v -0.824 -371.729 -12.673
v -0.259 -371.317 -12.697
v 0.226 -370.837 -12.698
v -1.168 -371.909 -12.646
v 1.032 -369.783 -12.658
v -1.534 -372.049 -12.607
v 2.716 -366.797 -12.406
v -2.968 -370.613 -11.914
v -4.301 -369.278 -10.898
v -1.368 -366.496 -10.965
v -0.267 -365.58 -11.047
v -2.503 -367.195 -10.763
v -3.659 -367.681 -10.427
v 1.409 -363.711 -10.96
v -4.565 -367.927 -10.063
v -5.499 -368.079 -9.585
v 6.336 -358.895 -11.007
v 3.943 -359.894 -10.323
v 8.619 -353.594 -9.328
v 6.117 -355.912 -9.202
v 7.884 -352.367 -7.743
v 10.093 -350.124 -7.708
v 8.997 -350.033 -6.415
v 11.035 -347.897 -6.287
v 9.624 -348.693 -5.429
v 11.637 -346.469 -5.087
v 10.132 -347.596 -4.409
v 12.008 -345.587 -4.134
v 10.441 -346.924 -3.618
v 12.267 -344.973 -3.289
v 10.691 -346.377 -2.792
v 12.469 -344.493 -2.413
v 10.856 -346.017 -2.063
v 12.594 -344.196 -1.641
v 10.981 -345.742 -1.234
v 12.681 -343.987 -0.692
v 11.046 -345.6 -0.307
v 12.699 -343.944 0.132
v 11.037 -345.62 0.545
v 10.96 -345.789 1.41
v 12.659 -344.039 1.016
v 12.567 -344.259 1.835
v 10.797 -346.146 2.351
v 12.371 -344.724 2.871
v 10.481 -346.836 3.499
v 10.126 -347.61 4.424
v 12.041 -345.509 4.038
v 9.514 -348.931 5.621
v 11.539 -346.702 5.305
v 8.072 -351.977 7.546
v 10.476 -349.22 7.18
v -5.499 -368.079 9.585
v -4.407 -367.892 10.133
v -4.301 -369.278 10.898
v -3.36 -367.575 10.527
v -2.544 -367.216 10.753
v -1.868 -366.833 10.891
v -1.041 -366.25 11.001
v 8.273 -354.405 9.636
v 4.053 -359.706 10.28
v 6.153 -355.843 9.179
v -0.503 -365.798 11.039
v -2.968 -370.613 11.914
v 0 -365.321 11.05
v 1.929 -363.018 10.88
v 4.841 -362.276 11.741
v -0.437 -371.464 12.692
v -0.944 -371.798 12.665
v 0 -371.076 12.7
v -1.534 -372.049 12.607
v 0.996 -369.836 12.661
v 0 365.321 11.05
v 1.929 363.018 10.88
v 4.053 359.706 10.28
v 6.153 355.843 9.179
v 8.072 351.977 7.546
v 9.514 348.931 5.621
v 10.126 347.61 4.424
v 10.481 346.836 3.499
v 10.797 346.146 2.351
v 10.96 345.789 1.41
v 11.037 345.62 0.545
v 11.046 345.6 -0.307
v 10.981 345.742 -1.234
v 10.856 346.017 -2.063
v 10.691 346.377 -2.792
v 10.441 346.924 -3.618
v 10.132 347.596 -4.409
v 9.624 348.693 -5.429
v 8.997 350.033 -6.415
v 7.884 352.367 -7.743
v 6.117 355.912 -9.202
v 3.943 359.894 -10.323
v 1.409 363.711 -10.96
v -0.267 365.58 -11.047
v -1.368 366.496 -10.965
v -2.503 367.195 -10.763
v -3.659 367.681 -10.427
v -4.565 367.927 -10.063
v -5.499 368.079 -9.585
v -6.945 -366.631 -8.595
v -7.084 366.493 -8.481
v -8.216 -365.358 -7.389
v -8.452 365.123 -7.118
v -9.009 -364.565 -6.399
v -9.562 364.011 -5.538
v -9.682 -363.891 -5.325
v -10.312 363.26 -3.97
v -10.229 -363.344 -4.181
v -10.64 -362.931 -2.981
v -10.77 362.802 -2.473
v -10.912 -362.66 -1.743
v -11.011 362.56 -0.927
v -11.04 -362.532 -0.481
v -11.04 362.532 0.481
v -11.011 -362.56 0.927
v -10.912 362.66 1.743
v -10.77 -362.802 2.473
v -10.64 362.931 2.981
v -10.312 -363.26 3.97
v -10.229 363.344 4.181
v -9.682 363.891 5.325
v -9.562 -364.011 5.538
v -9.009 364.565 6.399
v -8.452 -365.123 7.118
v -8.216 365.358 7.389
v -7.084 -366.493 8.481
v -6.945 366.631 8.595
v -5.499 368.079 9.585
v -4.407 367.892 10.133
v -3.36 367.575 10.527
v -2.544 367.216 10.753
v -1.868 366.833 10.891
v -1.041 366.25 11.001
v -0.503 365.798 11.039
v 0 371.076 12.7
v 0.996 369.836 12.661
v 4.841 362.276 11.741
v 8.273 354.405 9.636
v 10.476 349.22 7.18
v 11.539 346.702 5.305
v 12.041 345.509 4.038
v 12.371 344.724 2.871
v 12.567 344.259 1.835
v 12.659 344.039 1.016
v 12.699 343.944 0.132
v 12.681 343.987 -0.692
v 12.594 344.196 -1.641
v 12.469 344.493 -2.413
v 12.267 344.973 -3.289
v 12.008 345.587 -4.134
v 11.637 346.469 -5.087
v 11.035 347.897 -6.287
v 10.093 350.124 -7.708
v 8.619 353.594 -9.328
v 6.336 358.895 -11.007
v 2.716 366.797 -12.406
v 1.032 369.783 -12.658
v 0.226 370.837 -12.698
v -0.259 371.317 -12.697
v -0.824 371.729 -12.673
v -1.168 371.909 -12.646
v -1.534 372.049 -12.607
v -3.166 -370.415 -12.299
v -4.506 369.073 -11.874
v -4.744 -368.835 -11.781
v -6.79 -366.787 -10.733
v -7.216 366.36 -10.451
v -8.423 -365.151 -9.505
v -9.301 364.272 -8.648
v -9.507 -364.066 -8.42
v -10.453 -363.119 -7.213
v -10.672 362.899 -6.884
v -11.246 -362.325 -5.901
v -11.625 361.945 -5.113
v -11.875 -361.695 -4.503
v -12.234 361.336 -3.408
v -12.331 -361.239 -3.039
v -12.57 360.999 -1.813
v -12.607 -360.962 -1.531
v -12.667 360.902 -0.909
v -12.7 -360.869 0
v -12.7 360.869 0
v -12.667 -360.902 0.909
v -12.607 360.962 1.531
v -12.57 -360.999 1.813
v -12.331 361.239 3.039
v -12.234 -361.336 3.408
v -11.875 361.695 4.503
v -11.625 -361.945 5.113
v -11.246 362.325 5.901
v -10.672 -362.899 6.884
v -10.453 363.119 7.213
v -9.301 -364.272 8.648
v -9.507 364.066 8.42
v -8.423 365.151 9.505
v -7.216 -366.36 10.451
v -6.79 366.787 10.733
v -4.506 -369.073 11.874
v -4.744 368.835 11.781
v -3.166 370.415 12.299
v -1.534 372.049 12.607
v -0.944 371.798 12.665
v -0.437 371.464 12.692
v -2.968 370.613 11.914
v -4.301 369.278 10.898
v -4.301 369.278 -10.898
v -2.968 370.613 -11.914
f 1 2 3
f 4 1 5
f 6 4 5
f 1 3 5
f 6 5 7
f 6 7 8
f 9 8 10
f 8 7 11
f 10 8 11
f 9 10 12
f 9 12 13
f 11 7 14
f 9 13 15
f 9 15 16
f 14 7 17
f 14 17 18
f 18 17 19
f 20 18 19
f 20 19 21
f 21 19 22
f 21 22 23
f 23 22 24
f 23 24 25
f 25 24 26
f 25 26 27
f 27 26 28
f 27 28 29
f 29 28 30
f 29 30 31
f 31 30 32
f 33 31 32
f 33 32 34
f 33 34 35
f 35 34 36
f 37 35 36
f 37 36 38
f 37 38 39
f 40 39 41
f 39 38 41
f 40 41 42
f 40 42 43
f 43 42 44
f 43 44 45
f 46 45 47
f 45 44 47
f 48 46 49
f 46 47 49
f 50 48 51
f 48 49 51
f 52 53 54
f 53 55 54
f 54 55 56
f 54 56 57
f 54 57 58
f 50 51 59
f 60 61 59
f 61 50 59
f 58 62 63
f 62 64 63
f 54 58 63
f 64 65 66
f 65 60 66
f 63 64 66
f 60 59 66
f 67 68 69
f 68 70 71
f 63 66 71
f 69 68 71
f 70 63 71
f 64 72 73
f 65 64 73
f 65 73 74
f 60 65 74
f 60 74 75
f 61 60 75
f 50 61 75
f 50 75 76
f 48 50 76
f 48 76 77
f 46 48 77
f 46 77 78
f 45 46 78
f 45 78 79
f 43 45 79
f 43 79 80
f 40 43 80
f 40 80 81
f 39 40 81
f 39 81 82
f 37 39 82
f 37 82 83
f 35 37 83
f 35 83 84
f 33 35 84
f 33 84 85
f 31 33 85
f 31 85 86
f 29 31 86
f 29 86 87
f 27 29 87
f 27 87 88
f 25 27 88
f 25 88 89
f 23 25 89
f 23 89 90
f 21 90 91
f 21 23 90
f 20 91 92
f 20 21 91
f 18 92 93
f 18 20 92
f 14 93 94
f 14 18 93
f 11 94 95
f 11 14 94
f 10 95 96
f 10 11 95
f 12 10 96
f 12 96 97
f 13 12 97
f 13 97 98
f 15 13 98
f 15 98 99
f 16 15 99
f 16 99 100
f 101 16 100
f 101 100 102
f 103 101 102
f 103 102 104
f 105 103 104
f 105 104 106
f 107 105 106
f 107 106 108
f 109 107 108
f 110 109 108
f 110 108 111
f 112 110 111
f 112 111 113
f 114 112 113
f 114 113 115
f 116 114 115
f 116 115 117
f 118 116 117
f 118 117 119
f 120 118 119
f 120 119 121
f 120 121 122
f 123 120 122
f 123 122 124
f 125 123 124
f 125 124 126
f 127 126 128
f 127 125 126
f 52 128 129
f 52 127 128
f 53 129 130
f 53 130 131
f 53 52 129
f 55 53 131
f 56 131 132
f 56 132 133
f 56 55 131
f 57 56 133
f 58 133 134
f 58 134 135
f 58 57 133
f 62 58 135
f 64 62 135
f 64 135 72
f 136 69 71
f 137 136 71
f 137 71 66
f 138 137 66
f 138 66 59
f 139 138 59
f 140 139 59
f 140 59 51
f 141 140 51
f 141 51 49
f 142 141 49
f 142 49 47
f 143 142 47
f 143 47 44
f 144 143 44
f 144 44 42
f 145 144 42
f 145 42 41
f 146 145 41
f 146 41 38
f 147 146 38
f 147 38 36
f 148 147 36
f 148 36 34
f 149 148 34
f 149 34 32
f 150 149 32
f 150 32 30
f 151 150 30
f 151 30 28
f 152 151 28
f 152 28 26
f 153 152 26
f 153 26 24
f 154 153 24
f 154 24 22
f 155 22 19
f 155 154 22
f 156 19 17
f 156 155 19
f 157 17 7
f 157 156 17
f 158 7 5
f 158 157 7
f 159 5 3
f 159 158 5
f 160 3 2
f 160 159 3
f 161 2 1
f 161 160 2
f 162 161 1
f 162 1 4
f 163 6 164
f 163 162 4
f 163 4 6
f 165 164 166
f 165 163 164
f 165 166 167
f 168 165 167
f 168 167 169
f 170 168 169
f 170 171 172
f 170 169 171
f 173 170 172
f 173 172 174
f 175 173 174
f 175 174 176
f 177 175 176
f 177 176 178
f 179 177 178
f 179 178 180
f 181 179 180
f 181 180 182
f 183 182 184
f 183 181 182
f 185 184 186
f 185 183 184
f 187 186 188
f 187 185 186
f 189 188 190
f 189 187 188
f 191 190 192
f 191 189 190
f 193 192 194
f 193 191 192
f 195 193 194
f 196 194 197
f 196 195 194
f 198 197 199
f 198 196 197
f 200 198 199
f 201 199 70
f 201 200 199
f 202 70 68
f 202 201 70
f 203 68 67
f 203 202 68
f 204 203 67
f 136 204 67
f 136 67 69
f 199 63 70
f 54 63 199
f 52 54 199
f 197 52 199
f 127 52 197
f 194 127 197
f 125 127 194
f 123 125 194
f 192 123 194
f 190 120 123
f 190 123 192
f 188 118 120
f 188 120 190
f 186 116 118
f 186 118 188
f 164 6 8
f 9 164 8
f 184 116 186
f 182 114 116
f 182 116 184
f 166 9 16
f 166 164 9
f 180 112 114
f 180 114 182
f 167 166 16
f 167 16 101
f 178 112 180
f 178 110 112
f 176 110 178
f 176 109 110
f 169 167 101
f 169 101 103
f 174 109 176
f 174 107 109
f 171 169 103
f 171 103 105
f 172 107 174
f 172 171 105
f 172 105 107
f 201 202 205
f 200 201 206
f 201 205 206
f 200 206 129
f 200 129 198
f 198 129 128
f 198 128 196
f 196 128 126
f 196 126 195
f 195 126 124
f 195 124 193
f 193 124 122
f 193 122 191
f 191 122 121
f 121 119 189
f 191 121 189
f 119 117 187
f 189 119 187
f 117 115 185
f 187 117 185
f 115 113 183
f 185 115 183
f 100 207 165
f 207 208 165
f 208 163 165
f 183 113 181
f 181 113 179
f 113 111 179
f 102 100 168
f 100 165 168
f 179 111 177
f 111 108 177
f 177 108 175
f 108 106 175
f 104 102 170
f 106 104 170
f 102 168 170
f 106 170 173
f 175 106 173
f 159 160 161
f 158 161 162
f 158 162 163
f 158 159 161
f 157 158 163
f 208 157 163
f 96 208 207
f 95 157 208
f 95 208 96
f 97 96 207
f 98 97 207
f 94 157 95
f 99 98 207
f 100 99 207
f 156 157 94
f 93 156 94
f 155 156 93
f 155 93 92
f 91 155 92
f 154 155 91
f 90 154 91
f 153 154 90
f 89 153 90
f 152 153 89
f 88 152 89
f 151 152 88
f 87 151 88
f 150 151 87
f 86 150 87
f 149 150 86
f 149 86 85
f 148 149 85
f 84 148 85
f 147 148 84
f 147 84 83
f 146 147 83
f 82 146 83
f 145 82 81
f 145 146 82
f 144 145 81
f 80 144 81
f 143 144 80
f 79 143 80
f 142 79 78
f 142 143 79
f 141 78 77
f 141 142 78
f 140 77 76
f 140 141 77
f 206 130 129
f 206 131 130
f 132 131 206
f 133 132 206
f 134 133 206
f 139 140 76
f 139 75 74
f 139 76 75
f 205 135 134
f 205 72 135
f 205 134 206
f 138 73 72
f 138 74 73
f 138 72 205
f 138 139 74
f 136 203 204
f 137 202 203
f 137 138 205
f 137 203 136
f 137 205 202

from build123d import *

# Parameters (mm, degrees)
SKETCH1_R           = 12.7
SKETCH1_R_2         = 11.05
BOSS_EXTRUDE1_DEPTH = 375
SKETCH2_R           = 13
CUT_EXTRUDE1_DEPTH  = 751.21502251
CUT_EXTRUDE2_START  = -12.606982135
CUT_EXTRUDE2_DEPTH  = 25.21396427


# Read off the part's stored shape, not the designer's step: Cut-Extrude2
with BuildPart() as part:
    # Sketch1 → Boss-Extrude1 (new, symmetric)
    with BuildSketch(Plane(origin=(0, 0, 0), x_dir=(1, 0, 0), z_dir=(0, 1, 0))):
        with Locations(Location((0, 0, 0), (0, 0, 270))):
            Circle(SKETCH1_R)
        with Locations(Location((0, 0, 0), (0, 0, 270))):
            Circle(SKETCH1_R_2, mode=Mode.SUBTRACT)
    extrude(amount=BOSS_EXTRUDE1_DEPTH, both=True)

    # Sketch2 → Cut-Extrude1 (cut, symmetric)
    with BuildSketch(Plane(origin=(0, -375, 0), x_dir=(0, 0, -1), z_dir=(0.707545129365096, 0.7066681610994865, 0))):
        Circle(SKETCH2_R)
    cut_extrude1 = extrude(amount=CUT_EXTRUDE1_DEPTH, both=True, mode=Mode.SUBTRACT)

    # Mirror1: Cut-Extrude1 across plane
    add(cut_extrude1.mirror(Plane.ZX), mode=Mode.SUBTRACT)

    # Cut-Extrude2 outline → Cut-Extrude2 (cut)
    with BuildSketch(Plane.XY.offset(CUT_EXTRUDE2_START)):
        Polygon((0, -373.584908653), (-1.534275545, -372.048729087), (-12.7, -360.869148077), (-14, -359.56753479), (-14, -374), (0, -374), align=None)
    cut_extrude2 = extrude(amount=CUT_EXTRUDE2_DEPTH, mode=Mode.SUBTRACT)

    # Mirror2: Cut-Extrude2 across plane
    add(cut_extrude2.mirror(Plane.ZX), mode=Mode.SUBTRACT)


solid = part.part
